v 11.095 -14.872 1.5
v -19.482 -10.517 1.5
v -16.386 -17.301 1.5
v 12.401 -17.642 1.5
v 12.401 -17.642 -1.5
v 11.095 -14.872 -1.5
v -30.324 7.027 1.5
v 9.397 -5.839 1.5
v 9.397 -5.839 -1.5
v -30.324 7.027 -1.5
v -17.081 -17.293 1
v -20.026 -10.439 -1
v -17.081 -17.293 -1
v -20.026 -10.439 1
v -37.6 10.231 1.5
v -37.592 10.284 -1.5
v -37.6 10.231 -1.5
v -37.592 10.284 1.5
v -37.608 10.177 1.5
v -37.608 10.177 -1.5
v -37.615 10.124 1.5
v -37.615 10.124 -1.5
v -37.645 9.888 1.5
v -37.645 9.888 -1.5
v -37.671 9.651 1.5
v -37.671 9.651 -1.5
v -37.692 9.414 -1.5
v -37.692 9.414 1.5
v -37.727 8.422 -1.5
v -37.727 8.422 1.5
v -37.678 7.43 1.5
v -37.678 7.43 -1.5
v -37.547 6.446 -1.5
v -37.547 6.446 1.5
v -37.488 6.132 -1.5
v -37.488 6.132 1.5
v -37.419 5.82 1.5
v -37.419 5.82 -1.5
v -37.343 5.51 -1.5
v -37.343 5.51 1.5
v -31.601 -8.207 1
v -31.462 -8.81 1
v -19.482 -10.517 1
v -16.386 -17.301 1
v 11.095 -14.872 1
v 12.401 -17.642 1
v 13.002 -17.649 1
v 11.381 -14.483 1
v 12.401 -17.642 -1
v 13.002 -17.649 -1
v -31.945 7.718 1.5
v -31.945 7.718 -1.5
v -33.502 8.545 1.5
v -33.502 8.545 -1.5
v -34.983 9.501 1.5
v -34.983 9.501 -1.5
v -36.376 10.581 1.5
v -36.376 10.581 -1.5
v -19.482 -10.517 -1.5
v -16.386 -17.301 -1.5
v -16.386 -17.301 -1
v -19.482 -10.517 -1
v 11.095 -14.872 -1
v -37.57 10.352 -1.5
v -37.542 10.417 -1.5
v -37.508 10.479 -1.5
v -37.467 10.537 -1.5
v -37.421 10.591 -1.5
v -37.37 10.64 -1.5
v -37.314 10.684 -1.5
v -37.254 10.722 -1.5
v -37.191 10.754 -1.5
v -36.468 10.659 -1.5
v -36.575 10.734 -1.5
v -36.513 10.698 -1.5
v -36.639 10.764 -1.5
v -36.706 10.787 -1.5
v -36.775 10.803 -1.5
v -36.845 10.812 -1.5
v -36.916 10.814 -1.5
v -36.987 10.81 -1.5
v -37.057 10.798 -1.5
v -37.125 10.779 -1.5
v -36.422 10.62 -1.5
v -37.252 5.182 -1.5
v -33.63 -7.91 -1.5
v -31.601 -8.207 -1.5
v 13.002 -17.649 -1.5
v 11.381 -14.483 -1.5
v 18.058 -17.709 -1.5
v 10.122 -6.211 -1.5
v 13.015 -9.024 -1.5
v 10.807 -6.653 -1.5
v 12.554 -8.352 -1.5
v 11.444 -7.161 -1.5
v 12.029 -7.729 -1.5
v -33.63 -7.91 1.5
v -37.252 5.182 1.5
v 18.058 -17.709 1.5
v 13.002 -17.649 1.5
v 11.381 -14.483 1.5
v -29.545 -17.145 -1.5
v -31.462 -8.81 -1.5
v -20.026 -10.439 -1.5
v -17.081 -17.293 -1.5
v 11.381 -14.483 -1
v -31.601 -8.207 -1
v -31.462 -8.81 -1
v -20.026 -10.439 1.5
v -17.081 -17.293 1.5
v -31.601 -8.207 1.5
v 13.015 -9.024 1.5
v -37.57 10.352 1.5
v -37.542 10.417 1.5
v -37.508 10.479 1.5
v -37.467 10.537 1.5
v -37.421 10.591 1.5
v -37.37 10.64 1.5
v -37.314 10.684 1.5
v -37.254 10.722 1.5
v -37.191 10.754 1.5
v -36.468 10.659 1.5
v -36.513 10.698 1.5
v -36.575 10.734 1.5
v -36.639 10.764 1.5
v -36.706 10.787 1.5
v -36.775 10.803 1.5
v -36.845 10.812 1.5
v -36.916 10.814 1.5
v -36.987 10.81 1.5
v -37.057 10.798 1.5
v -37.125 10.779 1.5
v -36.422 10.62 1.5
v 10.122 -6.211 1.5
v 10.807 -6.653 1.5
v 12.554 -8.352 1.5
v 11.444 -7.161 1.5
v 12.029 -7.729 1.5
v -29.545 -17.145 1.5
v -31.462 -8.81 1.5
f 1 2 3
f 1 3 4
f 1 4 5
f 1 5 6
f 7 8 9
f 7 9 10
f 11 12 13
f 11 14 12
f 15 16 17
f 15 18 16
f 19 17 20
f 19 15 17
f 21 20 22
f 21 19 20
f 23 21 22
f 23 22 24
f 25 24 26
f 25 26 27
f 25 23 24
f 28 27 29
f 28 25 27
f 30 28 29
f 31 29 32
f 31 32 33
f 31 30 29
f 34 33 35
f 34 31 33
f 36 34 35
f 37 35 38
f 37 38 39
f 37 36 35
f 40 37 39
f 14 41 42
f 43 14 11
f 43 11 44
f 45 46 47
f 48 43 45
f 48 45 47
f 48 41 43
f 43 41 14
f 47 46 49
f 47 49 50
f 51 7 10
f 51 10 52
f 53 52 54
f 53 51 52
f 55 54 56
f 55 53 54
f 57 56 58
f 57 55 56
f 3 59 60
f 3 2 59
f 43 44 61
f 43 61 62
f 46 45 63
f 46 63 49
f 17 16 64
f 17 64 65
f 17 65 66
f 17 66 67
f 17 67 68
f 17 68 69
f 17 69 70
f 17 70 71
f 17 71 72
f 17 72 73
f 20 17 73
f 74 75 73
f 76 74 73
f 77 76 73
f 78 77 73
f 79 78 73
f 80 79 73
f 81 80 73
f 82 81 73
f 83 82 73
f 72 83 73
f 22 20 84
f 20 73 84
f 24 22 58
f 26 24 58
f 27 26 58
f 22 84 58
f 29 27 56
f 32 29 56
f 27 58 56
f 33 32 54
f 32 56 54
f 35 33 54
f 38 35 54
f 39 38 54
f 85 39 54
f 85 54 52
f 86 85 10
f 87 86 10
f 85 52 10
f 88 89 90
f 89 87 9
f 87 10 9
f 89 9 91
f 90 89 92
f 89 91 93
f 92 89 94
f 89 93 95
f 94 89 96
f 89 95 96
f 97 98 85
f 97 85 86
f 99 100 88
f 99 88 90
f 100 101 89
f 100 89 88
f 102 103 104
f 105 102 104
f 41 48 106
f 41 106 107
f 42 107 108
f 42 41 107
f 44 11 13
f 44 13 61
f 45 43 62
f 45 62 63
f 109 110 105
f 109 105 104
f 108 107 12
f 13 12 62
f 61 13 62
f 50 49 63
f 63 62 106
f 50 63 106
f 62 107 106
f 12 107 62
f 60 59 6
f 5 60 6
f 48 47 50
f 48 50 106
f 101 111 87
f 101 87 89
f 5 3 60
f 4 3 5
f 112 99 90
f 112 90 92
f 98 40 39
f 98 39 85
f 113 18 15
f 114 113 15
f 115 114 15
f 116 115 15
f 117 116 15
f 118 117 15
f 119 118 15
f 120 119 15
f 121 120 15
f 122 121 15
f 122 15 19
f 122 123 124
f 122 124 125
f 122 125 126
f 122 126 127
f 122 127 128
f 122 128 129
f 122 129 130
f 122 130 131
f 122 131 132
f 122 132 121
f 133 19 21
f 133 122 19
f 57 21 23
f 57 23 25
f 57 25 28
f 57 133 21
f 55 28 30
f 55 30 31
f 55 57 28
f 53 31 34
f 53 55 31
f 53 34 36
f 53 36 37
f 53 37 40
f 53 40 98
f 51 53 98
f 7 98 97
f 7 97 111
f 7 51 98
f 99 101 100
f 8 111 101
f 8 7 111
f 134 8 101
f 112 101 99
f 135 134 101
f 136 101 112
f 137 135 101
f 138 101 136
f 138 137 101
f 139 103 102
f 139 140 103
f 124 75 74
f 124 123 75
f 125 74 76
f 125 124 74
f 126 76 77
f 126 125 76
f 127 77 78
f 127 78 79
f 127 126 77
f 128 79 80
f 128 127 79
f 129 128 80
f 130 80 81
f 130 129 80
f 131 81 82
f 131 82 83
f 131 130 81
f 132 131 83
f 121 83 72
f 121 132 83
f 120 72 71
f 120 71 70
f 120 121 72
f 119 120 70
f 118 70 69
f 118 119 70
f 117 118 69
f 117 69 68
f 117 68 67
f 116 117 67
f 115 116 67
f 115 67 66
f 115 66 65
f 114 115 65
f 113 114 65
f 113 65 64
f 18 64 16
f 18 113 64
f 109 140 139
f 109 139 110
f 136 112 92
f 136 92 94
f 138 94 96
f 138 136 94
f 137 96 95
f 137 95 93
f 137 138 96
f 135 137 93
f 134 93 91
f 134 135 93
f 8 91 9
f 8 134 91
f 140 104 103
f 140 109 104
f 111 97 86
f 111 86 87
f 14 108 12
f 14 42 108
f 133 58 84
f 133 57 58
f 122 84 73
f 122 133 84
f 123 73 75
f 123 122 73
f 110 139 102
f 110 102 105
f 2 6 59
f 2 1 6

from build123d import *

# Parameters (mm, degrees)
F1_DEPTH      = 1.5
F1_DEPTH_BACK = 1.5
F2_DEPTH      = 1
F2_DEPTH_BACK = 1


with BuildPart() as f1:
    # F0 (on Top) → F1 (new body, two sides)
    with BuildSketch(Plane.XY) as f1_sk:
        with BuildLine():
            ThreePointArc((-37.5917032361, 10.284435004), (-37.6036541925, 10.2042280745), (-37.6150551658, 10.1239411223))
            ThreePointArc((-37.6150551658, 10.1239411223), (-36.9140789223, 9.3902881067), (-36.1911523713, 10.1023215633))
            ThreePointArc((-36.1911523713, 10.1023215633), (-36.2390172385, 10.3589917497), (-36.3761773631, 10.5811577471))
            ThreePointArc((-36.3761773631, 10.5811577471), (-36.444928714, 10.6395536611), (-36.5134240484, 10.6982496592))
            ThreePointArc((-36.5134240484, 10.6982496592), (-37.1584146425, 10.7671588816), (-37.5917032361, 10.284435004))
        make_face()
        with BuildLine():
            ThreePointArc((-37.6150551658, 10.1239411223), (-37.658727807, 9.7693120358), (-37.6916725948, 9.413525963))
            Line((-37.6916725948, 9.413525963), (-30.3237312473, 7.0269118533))
            ThreePointArc((-30.3237312473, 7.0269118533), (-33.5022351188, 8.5447191966), (-36.3761773631, 10.5811577471))
            ThreePointArc((-36.3761773631, 10.5811577471), (-36.2390172385, 10.3589917497), (-36.1911523713, 10.1023215633))
            ThreePointArc((-36.1911523713, 10.1023215633), (-36.9140789223, 9.3902881067), (-37.6150551658, 10.1239411223))
        make_face()
        with BuildLine():
            Line((-33.6302335127, -7.9102508416), (-31.6007956862, -8.2066003233))
            Line((-31.6007956862, -8.2066003233), (11.3807979287, -14.4830049639))
            Line((11.3807979287, -14.4830049639), (13.0020627939, -17.6492715746))
            Line((13.0020627939, -17.6492715746), (18.0582776666, -17.7091620862))
            Line((18.0582776666, -17.7091620862), (13.015336557, -9.0242120995))
            ThreePointArc((13.015336557, -9.0242120995), (11.4442463034, -7.1610379131), (9.3966493292, -5.8392628698))
            Line((9.3966493292, -5.8392628698), (-30.3237312473, 7.0269118533))
            Line((-30.3237312473, 7.0269118533), (-37.6916725948, 9.413525963))
            ThreePointArc((-37.6916725948, 9.413525963), (-37.7129517219, 7.9253137988), (-37.5472303476, 6.4462043799))
            ThreePointArc((-37.5472303476, 6.4462043799), (-37.4545060694, 5.9761457145), (-37.3428276399, 5.5102263341))
            Line((-37.3428276399, 5.5102263341), (-37.2520836129, 5.1822001342))
            Line((-37.2520836129, 5.1822001342), (-34.2308298218, -5.7391842553))
            Line((-34.2308298218, -5.7391842553), (-33.6302335127, -7.9102508416))
        make_face()
    extrude(amount=F1_DEPTH)
    extrude(f1_sk.sketch, amount=-F1_DEPTH_BACK)


with BuildPart() as f1b:
    # F0 (on Top) → F1, piece 2 (new body, two sides)
    with BuildSketch(Plane.XY) as f1_2_sk:
        Polygon((-31.4619966379, -8.8100739707), (-29.5448917896, -17.145305872), (-17.0812669576, -17.2929366368), (-20.0259792188, -10.4389979306), align=None)
    extrude(amount=F1_DEPTH)
    extrude(f1_2_sk.sketch, amount=-F1_DEPTH_BACK)


with BuildPart() as f1c:
    # F0 (on Top) → F1, piece 3 (new body, two sides)
    with BuildSketch(Plane.XY) as f1_3_sk:
        Polygon((-19.481760832, -10.5165153334), (-16.3864692258, -17.3011664673), (12.4006021974, -17.6421473158), (11.0948123038, -14.8717826232), align=None)
    extrude(amount=F1_DEPTH)
    extrude(f1_3_sk.sketch, amount=-F1_DEPTH_BACK)


with BuildPart() as f2:
    # F0 (on Top) → F2 (new body, two sides)
    with BuildSketch(Plane.XY) as f2_sk:
        Polygon((-20.0259792188, -10.4389979306), (-17.0812669576, -17.2929366368), (-16.3864692258, -17.3011664673), (-19.481760832, -10.5165153334), align=None)
        Polygon((-31.6007956862, -8.2066003233), (-31.4619966379, -8.8100739707), (-20.0259792188, -10.4389979306), (-19.481760832, -10.5165153334), (11.0948123038, -14.8717826232), (12.4006021974, -17.6421473158), (13.0020627939, -17.6492715746), (11.3807979287, -14.4830049639), align=None)
    extrude(amount=F2_DEPTH)
    extrude(f2_sk.sketch, amount=-F2_DEPTH_BACK)


solid = Compound([f1.part, f1b.part, f1c.part, f2.part])
